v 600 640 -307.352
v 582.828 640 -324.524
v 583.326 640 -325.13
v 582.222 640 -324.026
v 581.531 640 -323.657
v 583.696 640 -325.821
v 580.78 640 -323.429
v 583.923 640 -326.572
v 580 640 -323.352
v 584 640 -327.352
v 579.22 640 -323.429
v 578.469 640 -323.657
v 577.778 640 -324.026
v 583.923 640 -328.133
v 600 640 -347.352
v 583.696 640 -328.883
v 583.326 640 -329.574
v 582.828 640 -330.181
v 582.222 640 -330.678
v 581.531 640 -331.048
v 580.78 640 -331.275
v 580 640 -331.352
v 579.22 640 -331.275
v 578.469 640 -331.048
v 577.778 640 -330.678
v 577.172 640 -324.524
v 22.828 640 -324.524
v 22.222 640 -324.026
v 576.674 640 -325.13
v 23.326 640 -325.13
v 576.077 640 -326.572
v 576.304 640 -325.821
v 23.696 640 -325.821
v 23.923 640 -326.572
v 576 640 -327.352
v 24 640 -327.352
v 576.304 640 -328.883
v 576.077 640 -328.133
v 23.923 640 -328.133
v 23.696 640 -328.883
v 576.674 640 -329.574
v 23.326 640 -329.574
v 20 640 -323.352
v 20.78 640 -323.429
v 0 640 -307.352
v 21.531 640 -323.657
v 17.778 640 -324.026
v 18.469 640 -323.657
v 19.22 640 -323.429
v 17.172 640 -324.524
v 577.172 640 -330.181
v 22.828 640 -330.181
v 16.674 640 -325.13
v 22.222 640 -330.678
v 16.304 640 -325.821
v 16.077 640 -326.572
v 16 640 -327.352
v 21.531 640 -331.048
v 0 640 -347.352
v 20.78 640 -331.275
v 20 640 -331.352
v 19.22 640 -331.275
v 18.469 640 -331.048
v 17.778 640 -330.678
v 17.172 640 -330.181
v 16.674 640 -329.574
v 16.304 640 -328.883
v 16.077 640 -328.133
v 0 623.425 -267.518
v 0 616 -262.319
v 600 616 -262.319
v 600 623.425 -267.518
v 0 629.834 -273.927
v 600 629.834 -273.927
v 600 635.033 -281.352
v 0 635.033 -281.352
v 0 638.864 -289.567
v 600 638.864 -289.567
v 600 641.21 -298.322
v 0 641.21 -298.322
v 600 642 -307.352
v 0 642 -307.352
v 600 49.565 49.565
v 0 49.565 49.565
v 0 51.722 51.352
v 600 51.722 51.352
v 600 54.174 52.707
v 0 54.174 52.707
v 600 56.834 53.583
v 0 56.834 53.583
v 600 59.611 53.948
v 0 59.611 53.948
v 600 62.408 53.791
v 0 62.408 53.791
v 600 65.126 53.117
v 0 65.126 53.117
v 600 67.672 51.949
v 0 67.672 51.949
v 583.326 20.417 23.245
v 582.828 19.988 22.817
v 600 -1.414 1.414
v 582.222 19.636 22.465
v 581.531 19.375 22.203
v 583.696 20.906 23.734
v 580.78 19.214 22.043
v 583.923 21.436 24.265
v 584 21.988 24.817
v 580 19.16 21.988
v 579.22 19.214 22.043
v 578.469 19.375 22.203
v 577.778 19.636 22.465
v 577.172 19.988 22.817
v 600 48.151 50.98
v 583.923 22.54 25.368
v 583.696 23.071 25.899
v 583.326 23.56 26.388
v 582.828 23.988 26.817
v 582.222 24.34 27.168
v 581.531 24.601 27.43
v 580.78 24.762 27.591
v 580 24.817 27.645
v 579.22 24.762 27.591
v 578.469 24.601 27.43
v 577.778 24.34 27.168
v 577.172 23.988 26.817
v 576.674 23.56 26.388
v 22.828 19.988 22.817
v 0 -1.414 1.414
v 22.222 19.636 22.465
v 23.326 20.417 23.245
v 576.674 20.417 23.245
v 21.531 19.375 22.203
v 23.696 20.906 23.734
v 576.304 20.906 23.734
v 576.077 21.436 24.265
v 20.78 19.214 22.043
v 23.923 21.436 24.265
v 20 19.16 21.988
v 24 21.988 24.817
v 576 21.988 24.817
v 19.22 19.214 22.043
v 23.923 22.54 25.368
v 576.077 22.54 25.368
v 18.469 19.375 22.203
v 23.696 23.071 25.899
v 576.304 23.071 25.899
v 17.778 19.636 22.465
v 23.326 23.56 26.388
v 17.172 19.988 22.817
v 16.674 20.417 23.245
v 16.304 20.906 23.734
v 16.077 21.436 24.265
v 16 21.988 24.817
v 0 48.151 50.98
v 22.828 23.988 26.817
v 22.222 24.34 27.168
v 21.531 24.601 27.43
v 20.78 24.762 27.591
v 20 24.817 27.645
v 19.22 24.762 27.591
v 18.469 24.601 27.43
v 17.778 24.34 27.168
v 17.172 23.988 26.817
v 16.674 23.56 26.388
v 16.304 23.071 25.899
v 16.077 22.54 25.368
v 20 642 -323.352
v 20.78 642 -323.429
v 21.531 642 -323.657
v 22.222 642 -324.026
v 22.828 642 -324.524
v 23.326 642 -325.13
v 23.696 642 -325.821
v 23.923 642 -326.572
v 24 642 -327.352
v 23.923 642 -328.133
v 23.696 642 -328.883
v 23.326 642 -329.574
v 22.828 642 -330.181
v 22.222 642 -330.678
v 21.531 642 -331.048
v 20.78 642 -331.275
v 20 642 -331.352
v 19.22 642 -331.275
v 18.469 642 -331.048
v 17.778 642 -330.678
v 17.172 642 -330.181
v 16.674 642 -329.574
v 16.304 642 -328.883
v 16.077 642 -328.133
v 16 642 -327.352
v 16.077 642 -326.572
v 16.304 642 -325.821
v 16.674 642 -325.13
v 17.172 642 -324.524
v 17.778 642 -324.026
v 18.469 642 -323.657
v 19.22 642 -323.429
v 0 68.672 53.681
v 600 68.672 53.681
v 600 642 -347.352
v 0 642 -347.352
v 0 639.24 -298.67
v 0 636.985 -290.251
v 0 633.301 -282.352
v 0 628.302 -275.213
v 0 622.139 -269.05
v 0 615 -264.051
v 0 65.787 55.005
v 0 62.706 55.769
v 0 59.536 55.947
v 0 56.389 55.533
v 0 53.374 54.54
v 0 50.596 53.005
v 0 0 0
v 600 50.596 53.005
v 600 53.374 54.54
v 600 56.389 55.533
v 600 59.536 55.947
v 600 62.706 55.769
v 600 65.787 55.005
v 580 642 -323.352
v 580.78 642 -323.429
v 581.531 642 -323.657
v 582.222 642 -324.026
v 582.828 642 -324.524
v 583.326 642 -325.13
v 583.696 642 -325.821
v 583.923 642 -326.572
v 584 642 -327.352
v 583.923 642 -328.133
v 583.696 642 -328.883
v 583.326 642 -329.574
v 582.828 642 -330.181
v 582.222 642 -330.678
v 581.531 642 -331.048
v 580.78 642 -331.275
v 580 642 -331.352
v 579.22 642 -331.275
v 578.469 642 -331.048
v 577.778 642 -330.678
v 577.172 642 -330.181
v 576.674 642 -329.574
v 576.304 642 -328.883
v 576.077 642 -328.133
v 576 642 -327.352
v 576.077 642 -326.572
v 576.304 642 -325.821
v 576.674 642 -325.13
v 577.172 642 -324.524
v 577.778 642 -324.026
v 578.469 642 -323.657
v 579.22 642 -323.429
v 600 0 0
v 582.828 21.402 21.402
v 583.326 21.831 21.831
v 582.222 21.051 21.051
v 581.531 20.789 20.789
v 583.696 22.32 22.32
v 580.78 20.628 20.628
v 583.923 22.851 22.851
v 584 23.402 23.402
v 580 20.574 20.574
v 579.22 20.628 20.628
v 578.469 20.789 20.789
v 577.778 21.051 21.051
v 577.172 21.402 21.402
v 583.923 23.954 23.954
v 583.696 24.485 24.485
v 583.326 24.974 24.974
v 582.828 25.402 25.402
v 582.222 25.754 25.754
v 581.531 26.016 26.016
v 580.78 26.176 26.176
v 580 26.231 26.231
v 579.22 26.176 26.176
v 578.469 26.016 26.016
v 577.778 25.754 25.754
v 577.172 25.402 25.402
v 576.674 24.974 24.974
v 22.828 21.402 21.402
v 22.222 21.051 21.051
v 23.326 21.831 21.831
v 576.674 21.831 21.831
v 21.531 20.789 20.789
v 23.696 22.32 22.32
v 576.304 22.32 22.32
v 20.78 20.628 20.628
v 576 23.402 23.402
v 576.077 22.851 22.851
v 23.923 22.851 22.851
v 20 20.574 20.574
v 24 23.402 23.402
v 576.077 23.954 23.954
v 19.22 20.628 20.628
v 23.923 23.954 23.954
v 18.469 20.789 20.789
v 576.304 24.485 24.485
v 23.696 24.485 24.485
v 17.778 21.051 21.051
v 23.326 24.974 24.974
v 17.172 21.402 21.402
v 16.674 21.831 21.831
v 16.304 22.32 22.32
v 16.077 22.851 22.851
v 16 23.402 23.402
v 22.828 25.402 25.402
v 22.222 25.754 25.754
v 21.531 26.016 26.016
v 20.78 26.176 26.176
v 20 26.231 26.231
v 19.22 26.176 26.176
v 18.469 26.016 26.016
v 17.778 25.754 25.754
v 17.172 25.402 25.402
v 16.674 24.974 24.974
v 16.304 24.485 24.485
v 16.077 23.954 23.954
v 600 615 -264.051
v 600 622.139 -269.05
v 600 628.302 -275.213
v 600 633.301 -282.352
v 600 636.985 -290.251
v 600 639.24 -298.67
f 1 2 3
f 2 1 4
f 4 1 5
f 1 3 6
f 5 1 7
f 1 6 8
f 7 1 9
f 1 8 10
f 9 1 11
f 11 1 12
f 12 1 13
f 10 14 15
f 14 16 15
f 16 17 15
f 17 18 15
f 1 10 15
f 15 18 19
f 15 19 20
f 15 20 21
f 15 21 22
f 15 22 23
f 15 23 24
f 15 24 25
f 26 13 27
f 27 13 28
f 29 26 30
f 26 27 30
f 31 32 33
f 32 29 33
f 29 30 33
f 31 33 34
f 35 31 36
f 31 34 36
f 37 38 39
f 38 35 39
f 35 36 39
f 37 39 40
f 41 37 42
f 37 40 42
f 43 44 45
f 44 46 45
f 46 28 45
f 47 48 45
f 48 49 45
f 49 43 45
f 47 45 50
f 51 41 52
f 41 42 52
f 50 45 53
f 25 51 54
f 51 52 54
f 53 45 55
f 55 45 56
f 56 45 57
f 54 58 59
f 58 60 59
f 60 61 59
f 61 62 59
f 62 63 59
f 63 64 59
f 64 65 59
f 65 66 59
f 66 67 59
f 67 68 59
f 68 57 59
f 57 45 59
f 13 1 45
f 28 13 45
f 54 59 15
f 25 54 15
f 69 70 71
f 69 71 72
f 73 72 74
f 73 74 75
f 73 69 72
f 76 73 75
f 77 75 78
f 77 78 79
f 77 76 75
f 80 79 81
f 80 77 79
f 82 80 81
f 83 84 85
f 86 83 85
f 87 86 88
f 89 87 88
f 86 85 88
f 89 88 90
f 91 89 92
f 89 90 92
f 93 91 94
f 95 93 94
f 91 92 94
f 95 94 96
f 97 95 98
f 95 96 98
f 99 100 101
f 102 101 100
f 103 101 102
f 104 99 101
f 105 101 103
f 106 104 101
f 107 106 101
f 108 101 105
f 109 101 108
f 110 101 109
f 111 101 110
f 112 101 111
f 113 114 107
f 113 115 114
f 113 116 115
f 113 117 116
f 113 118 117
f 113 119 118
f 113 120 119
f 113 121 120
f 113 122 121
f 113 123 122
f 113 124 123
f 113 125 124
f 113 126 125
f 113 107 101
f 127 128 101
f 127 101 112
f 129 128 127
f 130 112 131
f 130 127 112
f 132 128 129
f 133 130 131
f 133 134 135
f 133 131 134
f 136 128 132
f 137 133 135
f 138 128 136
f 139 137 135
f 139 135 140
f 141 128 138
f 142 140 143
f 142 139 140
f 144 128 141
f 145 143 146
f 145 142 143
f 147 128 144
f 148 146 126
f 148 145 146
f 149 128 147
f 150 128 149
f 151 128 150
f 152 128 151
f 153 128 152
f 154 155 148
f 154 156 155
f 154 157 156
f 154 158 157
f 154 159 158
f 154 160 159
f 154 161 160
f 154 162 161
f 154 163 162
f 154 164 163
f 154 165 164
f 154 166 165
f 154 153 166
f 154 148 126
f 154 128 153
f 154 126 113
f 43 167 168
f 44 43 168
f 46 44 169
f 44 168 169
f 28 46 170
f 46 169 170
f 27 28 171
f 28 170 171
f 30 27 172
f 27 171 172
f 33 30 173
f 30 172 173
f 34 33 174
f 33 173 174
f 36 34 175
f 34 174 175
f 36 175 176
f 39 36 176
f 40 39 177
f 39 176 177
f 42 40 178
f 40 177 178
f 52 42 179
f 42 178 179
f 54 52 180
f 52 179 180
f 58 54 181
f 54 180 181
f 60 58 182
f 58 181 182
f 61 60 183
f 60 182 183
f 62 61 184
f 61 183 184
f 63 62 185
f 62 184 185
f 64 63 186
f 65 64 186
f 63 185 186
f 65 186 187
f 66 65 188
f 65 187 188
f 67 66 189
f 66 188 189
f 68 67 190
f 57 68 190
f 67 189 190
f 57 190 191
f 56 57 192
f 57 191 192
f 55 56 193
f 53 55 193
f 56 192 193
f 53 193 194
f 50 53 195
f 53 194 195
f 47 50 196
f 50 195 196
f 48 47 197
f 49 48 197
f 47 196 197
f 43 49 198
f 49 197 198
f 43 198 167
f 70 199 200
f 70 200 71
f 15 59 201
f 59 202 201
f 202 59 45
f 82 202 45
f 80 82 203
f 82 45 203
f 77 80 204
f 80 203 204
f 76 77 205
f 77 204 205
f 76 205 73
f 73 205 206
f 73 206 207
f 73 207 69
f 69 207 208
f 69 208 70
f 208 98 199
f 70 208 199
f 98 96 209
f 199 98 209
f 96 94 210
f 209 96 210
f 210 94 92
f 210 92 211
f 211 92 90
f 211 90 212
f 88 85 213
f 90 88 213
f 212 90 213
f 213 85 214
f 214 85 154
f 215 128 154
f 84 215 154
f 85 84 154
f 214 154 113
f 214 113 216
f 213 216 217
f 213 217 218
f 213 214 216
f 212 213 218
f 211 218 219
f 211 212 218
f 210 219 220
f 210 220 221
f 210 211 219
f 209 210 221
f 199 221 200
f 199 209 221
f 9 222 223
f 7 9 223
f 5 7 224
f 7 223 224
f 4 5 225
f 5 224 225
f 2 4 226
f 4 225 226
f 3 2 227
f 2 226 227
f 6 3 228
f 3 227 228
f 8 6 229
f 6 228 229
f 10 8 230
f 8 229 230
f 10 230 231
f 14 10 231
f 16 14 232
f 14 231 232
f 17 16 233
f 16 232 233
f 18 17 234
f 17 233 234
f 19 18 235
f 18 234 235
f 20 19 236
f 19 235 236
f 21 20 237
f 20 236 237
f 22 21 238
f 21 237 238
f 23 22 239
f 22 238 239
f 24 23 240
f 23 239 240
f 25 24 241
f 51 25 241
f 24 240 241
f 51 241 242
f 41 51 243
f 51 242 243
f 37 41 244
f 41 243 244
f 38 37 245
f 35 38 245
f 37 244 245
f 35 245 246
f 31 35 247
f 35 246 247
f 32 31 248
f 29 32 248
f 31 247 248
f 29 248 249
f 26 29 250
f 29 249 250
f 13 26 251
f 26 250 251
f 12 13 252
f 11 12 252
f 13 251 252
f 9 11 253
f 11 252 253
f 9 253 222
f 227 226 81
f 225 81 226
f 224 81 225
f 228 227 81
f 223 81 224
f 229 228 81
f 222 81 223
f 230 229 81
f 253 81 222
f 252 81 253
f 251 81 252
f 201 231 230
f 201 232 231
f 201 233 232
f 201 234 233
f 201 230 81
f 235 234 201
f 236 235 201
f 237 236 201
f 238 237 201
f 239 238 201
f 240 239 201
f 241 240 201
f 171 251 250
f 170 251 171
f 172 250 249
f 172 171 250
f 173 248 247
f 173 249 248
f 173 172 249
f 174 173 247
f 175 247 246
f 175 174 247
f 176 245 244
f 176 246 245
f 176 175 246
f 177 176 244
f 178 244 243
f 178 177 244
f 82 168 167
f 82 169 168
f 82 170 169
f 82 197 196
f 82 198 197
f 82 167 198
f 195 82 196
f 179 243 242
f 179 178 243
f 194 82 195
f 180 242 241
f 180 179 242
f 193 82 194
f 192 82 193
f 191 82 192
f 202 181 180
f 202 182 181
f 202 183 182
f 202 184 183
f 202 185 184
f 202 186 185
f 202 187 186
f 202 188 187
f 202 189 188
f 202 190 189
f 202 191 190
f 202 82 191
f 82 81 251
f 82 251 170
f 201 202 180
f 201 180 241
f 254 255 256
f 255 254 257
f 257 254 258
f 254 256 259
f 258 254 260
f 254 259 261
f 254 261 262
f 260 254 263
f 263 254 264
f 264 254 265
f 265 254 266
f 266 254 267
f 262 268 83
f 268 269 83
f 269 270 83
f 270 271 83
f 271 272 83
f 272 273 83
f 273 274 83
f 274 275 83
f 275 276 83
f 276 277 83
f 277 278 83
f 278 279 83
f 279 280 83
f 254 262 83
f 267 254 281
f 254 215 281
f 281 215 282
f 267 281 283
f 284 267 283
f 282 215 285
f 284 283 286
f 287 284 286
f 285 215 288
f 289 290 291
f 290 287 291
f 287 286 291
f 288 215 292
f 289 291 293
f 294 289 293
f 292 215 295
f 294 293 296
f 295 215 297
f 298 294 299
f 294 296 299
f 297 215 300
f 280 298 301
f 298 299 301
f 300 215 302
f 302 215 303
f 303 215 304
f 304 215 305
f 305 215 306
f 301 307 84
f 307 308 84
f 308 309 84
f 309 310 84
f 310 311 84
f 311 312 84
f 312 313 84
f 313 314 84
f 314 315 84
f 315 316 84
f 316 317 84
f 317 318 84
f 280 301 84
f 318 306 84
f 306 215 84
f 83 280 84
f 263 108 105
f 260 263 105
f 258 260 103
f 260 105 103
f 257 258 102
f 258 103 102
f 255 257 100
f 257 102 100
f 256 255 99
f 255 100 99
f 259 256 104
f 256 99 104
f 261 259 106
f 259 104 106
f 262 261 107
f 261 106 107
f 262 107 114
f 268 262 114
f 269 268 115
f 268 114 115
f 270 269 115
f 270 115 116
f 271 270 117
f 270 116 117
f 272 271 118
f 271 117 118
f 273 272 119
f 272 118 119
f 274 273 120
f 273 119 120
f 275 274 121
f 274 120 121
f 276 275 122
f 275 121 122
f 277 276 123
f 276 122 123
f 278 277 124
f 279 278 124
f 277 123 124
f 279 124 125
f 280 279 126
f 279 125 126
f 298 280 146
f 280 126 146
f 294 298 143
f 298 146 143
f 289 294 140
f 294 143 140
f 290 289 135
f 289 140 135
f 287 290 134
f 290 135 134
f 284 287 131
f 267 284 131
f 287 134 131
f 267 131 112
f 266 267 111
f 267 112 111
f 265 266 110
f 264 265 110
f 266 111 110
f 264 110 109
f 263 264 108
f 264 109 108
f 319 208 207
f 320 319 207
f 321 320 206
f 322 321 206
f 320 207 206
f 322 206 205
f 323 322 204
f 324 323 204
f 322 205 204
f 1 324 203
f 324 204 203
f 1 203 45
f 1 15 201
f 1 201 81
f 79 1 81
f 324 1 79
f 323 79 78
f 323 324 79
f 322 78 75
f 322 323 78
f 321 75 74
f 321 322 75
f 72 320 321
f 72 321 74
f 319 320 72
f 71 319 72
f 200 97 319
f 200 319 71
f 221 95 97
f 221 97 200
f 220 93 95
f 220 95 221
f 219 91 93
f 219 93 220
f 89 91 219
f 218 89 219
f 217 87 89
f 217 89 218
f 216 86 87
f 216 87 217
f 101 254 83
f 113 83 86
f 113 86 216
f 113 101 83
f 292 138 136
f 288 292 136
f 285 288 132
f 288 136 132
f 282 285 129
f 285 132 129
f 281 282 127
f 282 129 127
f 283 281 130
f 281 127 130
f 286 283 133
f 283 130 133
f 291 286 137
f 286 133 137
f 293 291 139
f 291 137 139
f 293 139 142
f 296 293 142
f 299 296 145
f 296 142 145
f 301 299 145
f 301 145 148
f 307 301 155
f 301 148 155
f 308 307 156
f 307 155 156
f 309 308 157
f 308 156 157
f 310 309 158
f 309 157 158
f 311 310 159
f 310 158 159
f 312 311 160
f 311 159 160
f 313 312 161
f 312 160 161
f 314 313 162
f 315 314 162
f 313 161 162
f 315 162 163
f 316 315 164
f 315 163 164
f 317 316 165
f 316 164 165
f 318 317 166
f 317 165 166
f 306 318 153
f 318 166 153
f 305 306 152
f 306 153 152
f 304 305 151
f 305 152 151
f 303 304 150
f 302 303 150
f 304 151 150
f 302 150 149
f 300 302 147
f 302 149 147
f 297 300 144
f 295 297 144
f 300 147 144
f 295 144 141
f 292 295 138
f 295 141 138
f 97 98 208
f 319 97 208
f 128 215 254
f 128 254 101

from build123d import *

# Parameters (mm, degrees)
SURFACE_EXTRUDE1_1_DEPTH = 600
THICKEN1_T1              = 2
SKETCH3_R                = 4
CUT_EXTRUDE1_DEPTH       = 2
SKETCH4_R                = 4
CUT_EXTRUDE2_DEPTH       = 2
LPATTERN1_COUNT          = 2
LPATTERN1_PITCH          = 560


with BuildPart() as body_1:
    # Surface-Extrude1: a surface, the sketch's curves swept straight by 600 mm
    with BuildLine(Plane(origin=(0, 0, 0), x_dir=(0, 0, -1), z_dir=(1, 0, 0)), mode=Mode.PRIVATE) as surface_extrude1_1_path:
        Line((0, 0), (-49.56534309, 49.56534309))
        ThreePointArc((-49.56534309, 49.56534309), (-53.830414293, 58.214051925), (-51.949122429, 67.671944808))
        Line((-51.949122429, 67.671944808), (264.050877571, 615))
        ThreePointArc((264.050877571, 615), (282.35214776, 633.301270189), (307.35214776, 640))
        Line((307.35214776, 640), (347.35214776, 640))
    surface_extrude1_1 = Shell.extrude(surface_extrude1_1_path.wire(), (1 * SURFACE_EXTRUDE1_1_DEPTH, 0 * SURFACE_EXTRUDE1_1_DEPTH, 0 * SURFACE_EXTRUDE1_1_DEPTH))
    add(Solid.thicken(surface_extrude1_1, THICKEN1_T1))

    # Sketch3 → Cut-Extrude1 (cut)
    with BuildSketch(Plane(origin=(0, -1.414213562, 1.414213562), x_dir=(1, 0, 0), z_dir=(0, -0.7071067811865517, 0.7071067811865434))):
        with Locations(Location((580, 33.095980422, 0), (0, 0, 270))):
            Circle(SKETCH3_R)
    cut_extrude1 = extrude(amount=-CUT_EXTRUDE1_DEPTH, mode=Mode.SUBTRACT)

    # Sketch4 → Cut-Extrude2 (cut)
    with BuildSketch(Plane(origin=(0, 642, 0), x_dir=(1, 0, 0), z_dir=(0, 1, 0))):
        with Locations(Location((580, 327.35214776, 0), (0, 0, 270))):
            Circle(SKETCH4_R)
    cut_extrude2 = extrude(amount=-CUT_EXTRUDE2_DEPTH, mode=Mode.SUBTRACT)

    # LPattern1: Cut-Extrude1, Cut-Extrude2 ×2
    with Locations(*[(-i * LPATTERN1_PITCH, 0, 0) for i in range(1, LPATTERN1_COUNT)]):
        add(cut_extrude1, mode=Mode.SUBTRACT)
        add(cut_extrude2, mode=Mode.SUBTRACT)


solid = body_1.part
